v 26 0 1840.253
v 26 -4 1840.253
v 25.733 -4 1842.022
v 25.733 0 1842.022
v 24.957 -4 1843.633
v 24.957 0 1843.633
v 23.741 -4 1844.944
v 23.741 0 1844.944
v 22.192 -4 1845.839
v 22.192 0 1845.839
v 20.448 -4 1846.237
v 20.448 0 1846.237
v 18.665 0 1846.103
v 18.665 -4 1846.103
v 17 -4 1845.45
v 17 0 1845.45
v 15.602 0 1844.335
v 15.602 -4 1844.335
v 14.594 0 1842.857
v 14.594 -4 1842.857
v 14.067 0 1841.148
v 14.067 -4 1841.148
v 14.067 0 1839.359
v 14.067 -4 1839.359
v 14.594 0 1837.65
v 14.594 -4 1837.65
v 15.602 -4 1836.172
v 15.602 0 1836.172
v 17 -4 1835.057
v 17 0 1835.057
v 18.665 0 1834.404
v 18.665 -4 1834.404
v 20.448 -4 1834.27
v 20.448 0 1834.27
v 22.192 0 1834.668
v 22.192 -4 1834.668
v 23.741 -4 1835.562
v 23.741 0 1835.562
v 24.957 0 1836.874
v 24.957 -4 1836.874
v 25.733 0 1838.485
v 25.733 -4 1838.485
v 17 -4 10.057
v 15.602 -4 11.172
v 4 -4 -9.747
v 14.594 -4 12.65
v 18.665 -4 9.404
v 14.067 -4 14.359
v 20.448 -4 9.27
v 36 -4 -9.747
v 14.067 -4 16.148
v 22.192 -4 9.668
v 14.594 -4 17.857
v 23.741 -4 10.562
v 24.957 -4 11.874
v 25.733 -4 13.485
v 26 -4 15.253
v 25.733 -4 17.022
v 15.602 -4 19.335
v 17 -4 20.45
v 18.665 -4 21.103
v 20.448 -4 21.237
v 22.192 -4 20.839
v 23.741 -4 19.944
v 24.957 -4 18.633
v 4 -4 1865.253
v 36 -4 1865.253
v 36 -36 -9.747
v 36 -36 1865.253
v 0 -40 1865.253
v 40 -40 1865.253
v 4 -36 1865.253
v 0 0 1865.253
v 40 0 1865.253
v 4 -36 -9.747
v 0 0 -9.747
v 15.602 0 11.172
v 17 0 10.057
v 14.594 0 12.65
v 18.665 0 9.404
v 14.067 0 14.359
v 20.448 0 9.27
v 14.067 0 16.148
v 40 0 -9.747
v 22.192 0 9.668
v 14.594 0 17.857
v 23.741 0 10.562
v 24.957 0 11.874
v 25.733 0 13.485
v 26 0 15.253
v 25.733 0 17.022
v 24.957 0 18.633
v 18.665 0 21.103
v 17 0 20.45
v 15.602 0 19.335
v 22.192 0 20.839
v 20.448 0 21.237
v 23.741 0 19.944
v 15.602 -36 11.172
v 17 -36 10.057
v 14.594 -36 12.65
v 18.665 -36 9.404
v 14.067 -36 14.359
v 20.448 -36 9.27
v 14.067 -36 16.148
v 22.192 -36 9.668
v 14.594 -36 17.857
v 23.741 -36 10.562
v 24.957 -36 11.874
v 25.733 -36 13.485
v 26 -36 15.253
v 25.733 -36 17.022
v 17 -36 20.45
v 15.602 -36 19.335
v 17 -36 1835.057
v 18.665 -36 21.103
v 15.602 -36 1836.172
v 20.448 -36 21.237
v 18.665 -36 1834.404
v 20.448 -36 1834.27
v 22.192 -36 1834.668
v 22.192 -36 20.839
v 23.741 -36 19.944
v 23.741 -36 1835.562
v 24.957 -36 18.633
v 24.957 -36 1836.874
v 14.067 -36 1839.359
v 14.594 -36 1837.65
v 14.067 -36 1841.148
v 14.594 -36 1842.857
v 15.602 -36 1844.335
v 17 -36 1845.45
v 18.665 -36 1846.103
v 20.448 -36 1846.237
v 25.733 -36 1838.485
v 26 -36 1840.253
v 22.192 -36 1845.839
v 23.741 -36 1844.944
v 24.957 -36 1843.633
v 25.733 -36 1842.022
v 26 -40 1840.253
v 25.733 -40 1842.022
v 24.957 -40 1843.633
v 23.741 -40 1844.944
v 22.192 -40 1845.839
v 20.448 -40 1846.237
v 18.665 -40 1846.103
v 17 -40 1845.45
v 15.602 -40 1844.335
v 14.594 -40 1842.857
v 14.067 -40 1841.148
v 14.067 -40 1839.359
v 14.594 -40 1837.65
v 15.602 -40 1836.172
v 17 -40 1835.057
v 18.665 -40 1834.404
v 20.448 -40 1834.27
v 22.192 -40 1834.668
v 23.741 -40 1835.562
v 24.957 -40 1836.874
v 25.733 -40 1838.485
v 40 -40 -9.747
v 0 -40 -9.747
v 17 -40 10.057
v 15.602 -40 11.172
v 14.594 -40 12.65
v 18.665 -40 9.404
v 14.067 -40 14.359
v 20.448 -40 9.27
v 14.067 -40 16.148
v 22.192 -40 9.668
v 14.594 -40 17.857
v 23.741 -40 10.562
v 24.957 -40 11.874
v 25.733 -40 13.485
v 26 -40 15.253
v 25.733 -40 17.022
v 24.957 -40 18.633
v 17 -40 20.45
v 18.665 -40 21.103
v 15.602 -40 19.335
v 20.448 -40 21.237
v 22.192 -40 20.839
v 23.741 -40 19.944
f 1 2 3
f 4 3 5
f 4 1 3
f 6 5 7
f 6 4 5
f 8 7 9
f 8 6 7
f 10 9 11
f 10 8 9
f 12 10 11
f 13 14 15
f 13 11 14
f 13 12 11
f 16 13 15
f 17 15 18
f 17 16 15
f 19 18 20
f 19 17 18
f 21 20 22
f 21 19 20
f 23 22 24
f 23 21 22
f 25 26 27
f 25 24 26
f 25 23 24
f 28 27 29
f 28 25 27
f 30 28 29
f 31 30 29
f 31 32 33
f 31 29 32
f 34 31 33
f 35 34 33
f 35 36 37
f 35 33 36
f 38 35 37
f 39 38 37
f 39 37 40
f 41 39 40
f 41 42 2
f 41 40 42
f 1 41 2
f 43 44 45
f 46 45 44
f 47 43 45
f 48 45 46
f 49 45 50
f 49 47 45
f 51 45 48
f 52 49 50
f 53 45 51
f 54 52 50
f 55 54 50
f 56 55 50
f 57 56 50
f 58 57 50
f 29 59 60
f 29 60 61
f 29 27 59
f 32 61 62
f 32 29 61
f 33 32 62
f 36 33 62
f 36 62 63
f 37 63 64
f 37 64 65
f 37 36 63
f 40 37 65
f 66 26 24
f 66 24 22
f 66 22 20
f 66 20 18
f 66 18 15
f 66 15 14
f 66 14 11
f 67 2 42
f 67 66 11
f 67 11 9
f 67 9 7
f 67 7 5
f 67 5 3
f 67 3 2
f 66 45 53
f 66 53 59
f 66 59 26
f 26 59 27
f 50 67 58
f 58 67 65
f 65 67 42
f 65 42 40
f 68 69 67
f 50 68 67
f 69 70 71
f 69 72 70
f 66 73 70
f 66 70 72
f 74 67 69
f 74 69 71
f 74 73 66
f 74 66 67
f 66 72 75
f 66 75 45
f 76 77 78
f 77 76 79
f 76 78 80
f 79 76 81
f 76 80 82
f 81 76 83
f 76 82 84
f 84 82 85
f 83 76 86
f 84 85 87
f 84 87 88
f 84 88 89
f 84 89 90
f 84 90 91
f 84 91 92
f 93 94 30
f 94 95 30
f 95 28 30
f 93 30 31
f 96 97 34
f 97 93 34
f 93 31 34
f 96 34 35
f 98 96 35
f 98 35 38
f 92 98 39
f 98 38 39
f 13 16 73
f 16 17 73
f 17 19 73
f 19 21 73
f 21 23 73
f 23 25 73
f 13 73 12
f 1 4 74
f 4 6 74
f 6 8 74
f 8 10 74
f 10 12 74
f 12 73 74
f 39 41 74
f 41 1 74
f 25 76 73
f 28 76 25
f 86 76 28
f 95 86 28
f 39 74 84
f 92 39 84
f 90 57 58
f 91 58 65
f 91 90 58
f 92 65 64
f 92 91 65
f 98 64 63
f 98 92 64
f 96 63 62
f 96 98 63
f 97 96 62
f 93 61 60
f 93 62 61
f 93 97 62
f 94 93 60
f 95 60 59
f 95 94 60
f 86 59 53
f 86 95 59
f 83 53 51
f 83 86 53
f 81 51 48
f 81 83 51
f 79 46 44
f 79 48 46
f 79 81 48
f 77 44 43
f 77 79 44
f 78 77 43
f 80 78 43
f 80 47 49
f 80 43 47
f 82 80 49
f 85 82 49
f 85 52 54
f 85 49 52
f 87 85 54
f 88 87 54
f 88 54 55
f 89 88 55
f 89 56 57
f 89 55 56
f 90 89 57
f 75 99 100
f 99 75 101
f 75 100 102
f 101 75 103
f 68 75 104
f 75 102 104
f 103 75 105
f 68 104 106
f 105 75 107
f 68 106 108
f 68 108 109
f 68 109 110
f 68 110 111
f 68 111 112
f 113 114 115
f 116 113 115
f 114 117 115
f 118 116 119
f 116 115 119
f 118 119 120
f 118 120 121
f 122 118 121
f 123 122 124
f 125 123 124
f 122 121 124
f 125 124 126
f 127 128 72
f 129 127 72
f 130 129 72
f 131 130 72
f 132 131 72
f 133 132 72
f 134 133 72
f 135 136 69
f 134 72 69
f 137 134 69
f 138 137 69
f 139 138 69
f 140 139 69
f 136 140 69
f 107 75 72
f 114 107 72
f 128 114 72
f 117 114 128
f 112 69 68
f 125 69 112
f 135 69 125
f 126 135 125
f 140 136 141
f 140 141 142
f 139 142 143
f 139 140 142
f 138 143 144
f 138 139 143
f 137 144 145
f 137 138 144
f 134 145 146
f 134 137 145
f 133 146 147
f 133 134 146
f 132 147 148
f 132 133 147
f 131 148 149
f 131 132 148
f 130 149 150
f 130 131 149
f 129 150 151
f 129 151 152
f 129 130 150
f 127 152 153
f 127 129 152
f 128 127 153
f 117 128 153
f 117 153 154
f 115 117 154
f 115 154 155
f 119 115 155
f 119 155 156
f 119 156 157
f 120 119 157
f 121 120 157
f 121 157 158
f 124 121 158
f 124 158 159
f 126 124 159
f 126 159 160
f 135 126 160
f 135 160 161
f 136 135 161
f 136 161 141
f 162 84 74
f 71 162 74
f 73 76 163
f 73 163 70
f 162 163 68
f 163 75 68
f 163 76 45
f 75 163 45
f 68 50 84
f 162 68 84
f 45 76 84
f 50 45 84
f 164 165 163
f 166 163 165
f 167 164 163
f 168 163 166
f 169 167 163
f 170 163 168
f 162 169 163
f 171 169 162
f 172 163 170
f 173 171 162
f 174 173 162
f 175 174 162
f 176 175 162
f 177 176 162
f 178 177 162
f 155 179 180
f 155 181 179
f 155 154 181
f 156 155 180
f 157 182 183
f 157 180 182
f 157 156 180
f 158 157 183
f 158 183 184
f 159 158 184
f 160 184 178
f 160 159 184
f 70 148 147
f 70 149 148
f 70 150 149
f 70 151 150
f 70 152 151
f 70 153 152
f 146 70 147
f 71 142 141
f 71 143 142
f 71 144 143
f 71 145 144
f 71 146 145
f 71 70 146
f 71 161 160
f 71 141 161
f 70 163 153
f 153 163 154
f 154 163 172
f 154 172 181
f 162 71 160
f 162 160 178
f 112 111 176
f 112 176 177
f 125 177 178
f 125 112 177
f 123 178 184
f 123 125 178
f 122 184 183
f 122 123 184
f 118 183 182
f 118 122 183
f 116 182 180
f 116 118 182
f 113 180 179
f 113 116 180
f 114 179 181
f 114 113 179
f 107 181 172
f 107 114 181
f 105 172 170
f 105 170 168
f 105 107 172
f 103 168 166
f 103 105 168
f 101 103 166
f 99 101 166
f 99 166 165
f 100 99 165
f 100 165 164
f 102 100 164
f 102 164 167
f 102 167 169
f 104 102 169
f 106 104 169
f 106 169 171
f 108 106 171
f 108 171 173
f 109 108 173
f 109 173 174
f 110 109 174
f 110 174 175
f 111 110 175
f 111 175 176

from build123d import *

# Parameters (mm, degrees)
F0_W     = 40
F0_H     = 1875
F0_R     = 6
F1_DEPTH = 40
F2_W     = 32
F2_H     = 32
F3_DEPTH = 1875.001


with BuildPart() as f1:
    # F0 (on Front) → F1 (new body)
    with BuildSketch(Plane.XZ):
        with Locations((20, 927.753484)):
            Rectangle(F0_W, F0_H)
        with Locations((20, 15.253484)):
            Circle(F0_R, mode=Mode.SUBTRACT)
        with Locations((20, 1840.253484)):
            Circle(F0_R, mode=Mode.SUBTRACT)
    extrude(amount=F1_DEPTH)

    # F2 (on face) → F3 (cut, through all)
    with BuildSketch(Plane.XY.offset(1865.253484)):
        with Locations((20, -20)):
            Rectangle(F2_W, F2_H)
    extrude(amount=-F3_DEPTH, mode=Mode.SUBTRACT)


solid = f1.part
